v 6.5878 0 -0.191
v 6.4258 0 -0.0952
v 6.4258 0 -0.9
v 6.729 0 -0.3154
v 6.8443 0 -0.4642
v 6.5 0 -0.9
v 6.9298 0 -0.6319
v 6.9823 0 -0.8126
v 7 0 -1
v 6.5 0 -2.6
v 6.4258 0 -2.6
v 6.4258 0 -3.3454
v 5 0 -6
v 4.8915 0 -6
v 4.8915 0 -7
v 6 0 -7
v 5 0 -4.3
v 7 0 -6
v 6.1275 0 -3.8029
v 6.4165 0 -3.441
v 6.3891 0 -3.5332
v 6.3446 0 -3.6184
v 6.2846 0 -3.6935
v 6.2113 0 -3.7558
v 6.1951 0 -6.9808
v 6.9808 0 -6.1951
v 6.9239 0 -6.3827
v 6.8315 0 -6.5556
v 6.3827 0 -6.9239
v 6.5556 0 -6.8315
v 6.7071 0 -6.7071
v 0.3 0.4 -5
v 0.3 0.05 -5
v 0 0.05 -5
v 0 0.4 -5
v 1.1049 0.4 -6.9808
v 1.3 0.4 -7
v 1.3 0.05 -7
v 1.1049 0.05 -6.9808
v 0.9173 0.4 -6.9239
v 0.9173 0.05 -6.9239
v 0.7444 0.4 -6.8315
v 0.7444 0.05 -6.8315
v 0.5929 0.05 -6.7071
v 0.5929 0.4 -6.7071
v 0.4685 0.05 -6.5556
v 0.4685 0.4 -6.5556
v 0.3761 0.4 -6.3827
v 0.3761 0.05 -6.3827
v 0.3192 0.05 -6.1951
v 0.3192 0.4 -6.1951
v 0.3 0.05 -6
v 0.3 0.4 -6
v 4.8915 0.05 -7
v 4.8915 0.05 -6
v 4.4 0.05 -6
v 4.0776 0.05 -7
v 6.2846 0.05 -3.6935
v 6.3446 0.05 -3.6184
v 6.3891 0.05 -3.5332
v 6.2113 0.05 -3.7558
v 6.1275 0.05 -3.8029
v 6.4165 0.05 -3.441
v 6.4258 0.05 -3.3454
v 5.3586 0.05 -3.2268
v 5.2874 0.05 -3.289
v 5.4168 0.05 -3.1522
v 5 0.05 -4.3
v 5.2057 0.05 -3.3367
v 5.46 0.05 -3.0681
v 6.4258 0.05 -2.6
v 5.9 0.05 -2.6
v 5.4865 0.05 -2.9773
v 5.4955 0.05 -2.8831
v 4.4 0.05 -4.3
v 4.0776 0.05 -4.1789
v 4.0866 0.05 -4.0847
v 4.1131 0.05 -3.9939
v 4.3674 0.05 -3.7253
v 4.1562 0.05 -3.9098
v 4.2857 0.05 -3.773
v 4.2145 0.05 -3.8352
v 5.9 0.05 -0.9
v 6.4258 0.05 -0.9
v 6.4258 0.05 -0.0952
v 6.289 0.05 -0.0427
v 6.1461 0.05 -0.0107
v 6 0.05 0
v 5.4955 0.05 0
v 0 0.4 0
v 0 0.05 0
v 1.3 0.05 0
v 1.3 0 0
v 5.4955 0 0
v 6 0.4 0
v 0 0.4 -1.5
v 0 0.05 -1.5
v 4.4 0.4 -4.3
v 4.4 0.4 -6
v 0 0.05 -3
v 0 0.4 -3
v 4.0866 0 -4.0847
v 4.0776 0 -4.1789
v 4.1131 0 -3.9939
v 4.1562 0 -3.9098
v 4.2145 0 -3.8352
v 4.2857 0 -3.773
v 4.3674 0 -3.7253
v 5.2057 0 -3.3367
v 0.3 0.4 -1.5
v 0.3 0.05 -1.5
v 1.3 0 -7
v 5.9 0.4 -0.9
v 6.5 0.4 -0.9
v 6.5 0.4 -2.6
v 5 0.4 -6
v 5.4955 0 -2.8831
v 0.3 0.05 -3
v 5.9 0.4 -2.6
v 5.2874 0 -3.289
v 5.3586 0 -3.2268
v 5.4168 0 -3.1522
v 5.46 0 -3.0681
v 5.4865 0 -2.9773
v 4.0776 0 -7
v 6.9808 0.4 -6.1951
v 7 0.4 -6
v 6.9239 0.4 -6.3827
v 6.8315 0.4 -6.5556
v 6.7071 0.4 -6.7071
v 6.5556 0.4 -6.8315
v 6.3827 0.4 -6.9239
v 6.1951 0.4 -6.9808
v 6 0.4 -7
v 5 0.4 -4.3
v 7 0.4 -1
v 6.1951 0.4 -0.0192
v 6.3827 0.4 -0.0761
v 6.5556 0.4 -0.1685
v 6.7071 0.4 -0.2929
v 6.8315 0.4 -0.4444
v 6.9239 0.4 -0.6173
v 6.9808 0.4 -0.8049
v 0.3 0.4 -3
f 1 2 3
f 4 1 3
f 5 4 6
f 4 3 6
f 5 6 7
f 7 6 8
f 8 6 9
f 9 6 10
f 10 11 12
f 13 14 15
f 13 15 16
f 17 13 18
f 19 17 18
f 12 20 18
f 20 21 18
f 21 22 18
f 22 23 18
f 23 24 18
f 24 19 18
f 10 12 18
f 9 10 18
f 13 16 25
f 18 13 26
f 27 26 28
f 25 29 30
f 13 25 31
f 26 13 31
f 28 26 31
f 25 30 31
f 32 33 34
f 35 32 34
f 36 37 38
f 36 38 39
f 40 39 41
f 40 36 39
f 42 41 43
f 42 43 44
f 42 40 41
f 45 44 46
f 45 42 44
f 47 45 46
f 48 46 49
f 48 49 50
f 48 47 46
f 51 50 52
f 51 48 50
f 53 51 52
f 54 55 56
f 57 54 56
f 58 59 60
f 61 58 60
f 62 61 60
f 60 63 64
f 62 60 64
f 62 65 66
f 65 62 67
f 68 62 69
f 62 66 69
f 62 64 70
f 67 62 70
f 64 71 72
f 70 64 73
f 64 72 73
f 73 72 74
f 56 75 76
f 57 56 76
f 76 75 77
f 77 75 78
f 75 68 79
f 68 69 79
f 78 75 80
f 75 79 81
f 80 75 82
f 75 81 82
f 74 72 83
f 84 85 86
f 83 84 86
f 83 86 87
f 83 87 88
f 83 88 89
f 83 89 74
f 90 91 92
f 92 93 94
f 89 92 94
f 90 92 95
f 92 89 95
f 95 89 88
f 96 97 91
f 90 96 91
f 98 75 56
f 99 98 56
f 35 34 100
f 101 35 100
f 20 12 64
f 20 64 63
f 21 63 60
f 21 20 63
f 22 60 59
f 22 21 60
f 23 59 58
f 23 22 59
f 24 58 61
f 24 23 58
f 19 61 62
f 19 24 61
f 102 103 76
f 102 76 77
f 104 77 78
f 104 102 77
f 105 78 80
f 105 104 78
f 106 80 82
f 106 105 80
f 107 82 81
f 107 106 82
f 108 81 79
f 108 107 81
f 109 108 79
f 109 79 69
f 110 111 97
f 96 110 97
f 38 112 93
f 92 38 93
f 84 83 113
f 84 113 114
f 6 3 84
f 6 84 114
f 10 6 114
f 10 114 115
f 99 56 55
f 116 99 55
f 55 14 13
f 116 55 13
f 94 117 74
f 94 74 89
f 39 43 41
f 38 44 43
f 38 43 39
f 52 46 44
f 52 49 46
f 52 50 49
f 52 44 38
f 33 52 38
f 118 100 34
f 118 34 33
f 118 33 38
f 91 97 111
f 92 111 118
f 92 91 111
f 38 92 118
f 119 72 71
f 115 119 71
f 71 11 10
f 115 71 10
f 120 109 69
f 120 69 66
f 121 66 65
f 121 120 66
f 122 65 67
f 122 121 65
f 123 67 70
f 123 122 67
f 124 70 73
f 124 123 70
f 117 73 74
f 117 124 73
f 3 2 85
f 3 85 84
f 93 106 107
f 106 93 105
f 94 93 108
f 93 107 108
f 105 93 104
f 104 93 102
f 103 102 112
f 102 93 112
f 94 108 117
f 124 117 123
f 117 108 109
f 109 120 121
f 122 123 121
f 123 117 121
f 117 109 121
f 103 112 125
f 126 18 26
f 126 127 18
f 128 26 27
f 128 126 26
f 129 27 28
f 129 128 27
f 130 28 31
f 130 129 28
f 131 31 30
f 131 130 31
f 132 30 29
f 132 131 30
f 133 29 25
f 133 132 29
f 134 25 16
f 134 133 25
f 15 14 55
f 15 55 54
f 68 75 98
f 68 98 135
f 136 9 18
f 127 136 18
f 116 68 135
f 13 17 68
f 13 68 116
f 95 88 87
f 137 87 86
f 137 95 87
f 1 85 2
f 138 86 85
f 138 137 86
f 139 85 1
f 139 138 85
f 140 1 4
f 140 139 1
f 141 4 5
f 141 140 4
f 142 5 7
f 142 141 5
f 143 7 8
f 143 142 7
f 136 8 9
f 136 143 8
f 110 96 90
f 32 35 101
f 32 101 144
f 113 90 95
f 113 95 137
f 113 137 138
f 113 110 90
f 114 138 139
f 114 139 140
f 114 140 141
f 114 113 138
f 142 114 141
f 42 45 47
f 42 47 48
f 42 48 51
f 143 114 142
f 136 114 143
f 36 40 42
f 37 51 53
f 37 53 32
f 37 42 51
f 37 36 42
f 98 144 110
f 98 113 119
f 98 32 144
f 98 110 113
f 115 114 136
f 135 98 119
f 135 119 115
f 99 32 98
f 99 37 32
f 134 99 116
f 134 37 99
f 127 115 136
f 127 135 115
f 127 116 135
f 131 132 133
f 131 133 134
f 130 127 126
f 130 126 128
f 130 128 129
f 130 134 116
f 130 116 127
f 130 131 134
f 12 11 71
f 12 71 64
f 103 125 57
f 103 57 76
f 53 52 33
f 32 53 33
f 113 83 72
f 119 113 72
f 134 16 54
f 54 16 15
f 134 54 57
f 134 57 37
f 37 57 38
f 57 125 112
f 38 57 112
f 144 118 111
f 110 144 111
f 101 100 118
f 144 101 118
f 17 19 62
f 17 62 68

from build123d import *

# Parameters (mm, degrees)
SKETCH1_W           = 0.6
SKETCH1_H           = 1.7
BOSS_EXTRUDE1_DEPTH = 0.4
FILLET1_R           = 1
SKETCH2_W           = 1.728090014
SKETCH2_H           = 7
CUT_EXTRUDE1_DEPTH  = 0.05


with BuildPart() as part:
    # Sketch1 → Boss-Extrude1 (new body)
    with BuildSketch(Plane(origin=(0, 0, 0), x_dir=(1, 0, 0), z_dir=(0, 1, 0))):
        Polygon((0, 0), (7, 0), (7, 7), (0.3, 7), (0.3, 5), (0, 5), (0, 3), (0.3, 3), (0.3, 1.5), (0, 1.5), align=None)
        with Locations((4.7, 5.15)):
            Rectangle(SKETCH1_W, SKETCH1_H, mode=Mode.SUBTRACT)
        with Locations((6.2, 1.75)):
            Rectangle(SKETCH1_W, SKETCH1_H, mode=Mode.SUBTRACT)
    extrude(amount=BOSS_EXTRUDE1_DEPTH)

    # Fillet1
    fillet1_edges = [part.edges().sort_by_distance(p)[0] for p in [
        (0.3, 0.2, -7),
        (7, 0.2, -7),
        (7, 0.2, 0),
    ]]
    fillet(fillet1_edges, radius=FILLET1_R)

    # Sketch2 → Cut-Extrude1 (cut)
    with BuildSketch(Plane.XZ):
        with BuildLine():
            Line((5, -6), (4.891522781, -6))
            Line((4.891522781, -6), (4.891522781, -7.295431915))
            Line((4.891522781, -7.295431915), (4.07762411, -7.295431915))
            Line((4.07762411, -7.295431915), (4.07762411, -4.178910814))
            ThreePointArc((4.07762411, -4.178910814), (4.156244956, -3.909764741), (4.367382545, -3.725260636))
            Line((4.367382545, -3.725260636), (5.20570378, -3.336745481))
            ThreePointArc((5.20570378, -3.336745481), (5.416841369, -3.152241376), (5.495462215, -2.883095303))
            Line((5.495462215, -2.883095303), (5.495462215, 0.578390888))
            Line((5.495462215, 0.578390888), (6.425754314, 0.578390888))
            Line((6.425754314, 0.578390888), (6.425754314, -0.9))
            Line((6.425754314, -0.9), (6.5, -0.9))
            Line((6.5, -0.9), (6.5, -2.6))
            Line((6.5, -2.6), (6.425754314, -2.6))
            Line((6.425754314, -2.6), (6.425754314, -3.345351228))
            ThreePointArc((6.425754314, -3.345351228), (6.344600523, -3.618422378), (6.127482902, -3.802850492))
            Line((6.127482902, -3.802850492), (5, -4.3))
            Line((5, -4.3), (5, -6))
        make_face()
        with Locations((0.435954993, -3.5)):
            Rectangle(SKETCH2_W, SKETCH2_H)
    extrude(amount=-CUT_EXTRUDE1_DEPTH, mode=Mode.SUBTRACT)


solid = part.part
